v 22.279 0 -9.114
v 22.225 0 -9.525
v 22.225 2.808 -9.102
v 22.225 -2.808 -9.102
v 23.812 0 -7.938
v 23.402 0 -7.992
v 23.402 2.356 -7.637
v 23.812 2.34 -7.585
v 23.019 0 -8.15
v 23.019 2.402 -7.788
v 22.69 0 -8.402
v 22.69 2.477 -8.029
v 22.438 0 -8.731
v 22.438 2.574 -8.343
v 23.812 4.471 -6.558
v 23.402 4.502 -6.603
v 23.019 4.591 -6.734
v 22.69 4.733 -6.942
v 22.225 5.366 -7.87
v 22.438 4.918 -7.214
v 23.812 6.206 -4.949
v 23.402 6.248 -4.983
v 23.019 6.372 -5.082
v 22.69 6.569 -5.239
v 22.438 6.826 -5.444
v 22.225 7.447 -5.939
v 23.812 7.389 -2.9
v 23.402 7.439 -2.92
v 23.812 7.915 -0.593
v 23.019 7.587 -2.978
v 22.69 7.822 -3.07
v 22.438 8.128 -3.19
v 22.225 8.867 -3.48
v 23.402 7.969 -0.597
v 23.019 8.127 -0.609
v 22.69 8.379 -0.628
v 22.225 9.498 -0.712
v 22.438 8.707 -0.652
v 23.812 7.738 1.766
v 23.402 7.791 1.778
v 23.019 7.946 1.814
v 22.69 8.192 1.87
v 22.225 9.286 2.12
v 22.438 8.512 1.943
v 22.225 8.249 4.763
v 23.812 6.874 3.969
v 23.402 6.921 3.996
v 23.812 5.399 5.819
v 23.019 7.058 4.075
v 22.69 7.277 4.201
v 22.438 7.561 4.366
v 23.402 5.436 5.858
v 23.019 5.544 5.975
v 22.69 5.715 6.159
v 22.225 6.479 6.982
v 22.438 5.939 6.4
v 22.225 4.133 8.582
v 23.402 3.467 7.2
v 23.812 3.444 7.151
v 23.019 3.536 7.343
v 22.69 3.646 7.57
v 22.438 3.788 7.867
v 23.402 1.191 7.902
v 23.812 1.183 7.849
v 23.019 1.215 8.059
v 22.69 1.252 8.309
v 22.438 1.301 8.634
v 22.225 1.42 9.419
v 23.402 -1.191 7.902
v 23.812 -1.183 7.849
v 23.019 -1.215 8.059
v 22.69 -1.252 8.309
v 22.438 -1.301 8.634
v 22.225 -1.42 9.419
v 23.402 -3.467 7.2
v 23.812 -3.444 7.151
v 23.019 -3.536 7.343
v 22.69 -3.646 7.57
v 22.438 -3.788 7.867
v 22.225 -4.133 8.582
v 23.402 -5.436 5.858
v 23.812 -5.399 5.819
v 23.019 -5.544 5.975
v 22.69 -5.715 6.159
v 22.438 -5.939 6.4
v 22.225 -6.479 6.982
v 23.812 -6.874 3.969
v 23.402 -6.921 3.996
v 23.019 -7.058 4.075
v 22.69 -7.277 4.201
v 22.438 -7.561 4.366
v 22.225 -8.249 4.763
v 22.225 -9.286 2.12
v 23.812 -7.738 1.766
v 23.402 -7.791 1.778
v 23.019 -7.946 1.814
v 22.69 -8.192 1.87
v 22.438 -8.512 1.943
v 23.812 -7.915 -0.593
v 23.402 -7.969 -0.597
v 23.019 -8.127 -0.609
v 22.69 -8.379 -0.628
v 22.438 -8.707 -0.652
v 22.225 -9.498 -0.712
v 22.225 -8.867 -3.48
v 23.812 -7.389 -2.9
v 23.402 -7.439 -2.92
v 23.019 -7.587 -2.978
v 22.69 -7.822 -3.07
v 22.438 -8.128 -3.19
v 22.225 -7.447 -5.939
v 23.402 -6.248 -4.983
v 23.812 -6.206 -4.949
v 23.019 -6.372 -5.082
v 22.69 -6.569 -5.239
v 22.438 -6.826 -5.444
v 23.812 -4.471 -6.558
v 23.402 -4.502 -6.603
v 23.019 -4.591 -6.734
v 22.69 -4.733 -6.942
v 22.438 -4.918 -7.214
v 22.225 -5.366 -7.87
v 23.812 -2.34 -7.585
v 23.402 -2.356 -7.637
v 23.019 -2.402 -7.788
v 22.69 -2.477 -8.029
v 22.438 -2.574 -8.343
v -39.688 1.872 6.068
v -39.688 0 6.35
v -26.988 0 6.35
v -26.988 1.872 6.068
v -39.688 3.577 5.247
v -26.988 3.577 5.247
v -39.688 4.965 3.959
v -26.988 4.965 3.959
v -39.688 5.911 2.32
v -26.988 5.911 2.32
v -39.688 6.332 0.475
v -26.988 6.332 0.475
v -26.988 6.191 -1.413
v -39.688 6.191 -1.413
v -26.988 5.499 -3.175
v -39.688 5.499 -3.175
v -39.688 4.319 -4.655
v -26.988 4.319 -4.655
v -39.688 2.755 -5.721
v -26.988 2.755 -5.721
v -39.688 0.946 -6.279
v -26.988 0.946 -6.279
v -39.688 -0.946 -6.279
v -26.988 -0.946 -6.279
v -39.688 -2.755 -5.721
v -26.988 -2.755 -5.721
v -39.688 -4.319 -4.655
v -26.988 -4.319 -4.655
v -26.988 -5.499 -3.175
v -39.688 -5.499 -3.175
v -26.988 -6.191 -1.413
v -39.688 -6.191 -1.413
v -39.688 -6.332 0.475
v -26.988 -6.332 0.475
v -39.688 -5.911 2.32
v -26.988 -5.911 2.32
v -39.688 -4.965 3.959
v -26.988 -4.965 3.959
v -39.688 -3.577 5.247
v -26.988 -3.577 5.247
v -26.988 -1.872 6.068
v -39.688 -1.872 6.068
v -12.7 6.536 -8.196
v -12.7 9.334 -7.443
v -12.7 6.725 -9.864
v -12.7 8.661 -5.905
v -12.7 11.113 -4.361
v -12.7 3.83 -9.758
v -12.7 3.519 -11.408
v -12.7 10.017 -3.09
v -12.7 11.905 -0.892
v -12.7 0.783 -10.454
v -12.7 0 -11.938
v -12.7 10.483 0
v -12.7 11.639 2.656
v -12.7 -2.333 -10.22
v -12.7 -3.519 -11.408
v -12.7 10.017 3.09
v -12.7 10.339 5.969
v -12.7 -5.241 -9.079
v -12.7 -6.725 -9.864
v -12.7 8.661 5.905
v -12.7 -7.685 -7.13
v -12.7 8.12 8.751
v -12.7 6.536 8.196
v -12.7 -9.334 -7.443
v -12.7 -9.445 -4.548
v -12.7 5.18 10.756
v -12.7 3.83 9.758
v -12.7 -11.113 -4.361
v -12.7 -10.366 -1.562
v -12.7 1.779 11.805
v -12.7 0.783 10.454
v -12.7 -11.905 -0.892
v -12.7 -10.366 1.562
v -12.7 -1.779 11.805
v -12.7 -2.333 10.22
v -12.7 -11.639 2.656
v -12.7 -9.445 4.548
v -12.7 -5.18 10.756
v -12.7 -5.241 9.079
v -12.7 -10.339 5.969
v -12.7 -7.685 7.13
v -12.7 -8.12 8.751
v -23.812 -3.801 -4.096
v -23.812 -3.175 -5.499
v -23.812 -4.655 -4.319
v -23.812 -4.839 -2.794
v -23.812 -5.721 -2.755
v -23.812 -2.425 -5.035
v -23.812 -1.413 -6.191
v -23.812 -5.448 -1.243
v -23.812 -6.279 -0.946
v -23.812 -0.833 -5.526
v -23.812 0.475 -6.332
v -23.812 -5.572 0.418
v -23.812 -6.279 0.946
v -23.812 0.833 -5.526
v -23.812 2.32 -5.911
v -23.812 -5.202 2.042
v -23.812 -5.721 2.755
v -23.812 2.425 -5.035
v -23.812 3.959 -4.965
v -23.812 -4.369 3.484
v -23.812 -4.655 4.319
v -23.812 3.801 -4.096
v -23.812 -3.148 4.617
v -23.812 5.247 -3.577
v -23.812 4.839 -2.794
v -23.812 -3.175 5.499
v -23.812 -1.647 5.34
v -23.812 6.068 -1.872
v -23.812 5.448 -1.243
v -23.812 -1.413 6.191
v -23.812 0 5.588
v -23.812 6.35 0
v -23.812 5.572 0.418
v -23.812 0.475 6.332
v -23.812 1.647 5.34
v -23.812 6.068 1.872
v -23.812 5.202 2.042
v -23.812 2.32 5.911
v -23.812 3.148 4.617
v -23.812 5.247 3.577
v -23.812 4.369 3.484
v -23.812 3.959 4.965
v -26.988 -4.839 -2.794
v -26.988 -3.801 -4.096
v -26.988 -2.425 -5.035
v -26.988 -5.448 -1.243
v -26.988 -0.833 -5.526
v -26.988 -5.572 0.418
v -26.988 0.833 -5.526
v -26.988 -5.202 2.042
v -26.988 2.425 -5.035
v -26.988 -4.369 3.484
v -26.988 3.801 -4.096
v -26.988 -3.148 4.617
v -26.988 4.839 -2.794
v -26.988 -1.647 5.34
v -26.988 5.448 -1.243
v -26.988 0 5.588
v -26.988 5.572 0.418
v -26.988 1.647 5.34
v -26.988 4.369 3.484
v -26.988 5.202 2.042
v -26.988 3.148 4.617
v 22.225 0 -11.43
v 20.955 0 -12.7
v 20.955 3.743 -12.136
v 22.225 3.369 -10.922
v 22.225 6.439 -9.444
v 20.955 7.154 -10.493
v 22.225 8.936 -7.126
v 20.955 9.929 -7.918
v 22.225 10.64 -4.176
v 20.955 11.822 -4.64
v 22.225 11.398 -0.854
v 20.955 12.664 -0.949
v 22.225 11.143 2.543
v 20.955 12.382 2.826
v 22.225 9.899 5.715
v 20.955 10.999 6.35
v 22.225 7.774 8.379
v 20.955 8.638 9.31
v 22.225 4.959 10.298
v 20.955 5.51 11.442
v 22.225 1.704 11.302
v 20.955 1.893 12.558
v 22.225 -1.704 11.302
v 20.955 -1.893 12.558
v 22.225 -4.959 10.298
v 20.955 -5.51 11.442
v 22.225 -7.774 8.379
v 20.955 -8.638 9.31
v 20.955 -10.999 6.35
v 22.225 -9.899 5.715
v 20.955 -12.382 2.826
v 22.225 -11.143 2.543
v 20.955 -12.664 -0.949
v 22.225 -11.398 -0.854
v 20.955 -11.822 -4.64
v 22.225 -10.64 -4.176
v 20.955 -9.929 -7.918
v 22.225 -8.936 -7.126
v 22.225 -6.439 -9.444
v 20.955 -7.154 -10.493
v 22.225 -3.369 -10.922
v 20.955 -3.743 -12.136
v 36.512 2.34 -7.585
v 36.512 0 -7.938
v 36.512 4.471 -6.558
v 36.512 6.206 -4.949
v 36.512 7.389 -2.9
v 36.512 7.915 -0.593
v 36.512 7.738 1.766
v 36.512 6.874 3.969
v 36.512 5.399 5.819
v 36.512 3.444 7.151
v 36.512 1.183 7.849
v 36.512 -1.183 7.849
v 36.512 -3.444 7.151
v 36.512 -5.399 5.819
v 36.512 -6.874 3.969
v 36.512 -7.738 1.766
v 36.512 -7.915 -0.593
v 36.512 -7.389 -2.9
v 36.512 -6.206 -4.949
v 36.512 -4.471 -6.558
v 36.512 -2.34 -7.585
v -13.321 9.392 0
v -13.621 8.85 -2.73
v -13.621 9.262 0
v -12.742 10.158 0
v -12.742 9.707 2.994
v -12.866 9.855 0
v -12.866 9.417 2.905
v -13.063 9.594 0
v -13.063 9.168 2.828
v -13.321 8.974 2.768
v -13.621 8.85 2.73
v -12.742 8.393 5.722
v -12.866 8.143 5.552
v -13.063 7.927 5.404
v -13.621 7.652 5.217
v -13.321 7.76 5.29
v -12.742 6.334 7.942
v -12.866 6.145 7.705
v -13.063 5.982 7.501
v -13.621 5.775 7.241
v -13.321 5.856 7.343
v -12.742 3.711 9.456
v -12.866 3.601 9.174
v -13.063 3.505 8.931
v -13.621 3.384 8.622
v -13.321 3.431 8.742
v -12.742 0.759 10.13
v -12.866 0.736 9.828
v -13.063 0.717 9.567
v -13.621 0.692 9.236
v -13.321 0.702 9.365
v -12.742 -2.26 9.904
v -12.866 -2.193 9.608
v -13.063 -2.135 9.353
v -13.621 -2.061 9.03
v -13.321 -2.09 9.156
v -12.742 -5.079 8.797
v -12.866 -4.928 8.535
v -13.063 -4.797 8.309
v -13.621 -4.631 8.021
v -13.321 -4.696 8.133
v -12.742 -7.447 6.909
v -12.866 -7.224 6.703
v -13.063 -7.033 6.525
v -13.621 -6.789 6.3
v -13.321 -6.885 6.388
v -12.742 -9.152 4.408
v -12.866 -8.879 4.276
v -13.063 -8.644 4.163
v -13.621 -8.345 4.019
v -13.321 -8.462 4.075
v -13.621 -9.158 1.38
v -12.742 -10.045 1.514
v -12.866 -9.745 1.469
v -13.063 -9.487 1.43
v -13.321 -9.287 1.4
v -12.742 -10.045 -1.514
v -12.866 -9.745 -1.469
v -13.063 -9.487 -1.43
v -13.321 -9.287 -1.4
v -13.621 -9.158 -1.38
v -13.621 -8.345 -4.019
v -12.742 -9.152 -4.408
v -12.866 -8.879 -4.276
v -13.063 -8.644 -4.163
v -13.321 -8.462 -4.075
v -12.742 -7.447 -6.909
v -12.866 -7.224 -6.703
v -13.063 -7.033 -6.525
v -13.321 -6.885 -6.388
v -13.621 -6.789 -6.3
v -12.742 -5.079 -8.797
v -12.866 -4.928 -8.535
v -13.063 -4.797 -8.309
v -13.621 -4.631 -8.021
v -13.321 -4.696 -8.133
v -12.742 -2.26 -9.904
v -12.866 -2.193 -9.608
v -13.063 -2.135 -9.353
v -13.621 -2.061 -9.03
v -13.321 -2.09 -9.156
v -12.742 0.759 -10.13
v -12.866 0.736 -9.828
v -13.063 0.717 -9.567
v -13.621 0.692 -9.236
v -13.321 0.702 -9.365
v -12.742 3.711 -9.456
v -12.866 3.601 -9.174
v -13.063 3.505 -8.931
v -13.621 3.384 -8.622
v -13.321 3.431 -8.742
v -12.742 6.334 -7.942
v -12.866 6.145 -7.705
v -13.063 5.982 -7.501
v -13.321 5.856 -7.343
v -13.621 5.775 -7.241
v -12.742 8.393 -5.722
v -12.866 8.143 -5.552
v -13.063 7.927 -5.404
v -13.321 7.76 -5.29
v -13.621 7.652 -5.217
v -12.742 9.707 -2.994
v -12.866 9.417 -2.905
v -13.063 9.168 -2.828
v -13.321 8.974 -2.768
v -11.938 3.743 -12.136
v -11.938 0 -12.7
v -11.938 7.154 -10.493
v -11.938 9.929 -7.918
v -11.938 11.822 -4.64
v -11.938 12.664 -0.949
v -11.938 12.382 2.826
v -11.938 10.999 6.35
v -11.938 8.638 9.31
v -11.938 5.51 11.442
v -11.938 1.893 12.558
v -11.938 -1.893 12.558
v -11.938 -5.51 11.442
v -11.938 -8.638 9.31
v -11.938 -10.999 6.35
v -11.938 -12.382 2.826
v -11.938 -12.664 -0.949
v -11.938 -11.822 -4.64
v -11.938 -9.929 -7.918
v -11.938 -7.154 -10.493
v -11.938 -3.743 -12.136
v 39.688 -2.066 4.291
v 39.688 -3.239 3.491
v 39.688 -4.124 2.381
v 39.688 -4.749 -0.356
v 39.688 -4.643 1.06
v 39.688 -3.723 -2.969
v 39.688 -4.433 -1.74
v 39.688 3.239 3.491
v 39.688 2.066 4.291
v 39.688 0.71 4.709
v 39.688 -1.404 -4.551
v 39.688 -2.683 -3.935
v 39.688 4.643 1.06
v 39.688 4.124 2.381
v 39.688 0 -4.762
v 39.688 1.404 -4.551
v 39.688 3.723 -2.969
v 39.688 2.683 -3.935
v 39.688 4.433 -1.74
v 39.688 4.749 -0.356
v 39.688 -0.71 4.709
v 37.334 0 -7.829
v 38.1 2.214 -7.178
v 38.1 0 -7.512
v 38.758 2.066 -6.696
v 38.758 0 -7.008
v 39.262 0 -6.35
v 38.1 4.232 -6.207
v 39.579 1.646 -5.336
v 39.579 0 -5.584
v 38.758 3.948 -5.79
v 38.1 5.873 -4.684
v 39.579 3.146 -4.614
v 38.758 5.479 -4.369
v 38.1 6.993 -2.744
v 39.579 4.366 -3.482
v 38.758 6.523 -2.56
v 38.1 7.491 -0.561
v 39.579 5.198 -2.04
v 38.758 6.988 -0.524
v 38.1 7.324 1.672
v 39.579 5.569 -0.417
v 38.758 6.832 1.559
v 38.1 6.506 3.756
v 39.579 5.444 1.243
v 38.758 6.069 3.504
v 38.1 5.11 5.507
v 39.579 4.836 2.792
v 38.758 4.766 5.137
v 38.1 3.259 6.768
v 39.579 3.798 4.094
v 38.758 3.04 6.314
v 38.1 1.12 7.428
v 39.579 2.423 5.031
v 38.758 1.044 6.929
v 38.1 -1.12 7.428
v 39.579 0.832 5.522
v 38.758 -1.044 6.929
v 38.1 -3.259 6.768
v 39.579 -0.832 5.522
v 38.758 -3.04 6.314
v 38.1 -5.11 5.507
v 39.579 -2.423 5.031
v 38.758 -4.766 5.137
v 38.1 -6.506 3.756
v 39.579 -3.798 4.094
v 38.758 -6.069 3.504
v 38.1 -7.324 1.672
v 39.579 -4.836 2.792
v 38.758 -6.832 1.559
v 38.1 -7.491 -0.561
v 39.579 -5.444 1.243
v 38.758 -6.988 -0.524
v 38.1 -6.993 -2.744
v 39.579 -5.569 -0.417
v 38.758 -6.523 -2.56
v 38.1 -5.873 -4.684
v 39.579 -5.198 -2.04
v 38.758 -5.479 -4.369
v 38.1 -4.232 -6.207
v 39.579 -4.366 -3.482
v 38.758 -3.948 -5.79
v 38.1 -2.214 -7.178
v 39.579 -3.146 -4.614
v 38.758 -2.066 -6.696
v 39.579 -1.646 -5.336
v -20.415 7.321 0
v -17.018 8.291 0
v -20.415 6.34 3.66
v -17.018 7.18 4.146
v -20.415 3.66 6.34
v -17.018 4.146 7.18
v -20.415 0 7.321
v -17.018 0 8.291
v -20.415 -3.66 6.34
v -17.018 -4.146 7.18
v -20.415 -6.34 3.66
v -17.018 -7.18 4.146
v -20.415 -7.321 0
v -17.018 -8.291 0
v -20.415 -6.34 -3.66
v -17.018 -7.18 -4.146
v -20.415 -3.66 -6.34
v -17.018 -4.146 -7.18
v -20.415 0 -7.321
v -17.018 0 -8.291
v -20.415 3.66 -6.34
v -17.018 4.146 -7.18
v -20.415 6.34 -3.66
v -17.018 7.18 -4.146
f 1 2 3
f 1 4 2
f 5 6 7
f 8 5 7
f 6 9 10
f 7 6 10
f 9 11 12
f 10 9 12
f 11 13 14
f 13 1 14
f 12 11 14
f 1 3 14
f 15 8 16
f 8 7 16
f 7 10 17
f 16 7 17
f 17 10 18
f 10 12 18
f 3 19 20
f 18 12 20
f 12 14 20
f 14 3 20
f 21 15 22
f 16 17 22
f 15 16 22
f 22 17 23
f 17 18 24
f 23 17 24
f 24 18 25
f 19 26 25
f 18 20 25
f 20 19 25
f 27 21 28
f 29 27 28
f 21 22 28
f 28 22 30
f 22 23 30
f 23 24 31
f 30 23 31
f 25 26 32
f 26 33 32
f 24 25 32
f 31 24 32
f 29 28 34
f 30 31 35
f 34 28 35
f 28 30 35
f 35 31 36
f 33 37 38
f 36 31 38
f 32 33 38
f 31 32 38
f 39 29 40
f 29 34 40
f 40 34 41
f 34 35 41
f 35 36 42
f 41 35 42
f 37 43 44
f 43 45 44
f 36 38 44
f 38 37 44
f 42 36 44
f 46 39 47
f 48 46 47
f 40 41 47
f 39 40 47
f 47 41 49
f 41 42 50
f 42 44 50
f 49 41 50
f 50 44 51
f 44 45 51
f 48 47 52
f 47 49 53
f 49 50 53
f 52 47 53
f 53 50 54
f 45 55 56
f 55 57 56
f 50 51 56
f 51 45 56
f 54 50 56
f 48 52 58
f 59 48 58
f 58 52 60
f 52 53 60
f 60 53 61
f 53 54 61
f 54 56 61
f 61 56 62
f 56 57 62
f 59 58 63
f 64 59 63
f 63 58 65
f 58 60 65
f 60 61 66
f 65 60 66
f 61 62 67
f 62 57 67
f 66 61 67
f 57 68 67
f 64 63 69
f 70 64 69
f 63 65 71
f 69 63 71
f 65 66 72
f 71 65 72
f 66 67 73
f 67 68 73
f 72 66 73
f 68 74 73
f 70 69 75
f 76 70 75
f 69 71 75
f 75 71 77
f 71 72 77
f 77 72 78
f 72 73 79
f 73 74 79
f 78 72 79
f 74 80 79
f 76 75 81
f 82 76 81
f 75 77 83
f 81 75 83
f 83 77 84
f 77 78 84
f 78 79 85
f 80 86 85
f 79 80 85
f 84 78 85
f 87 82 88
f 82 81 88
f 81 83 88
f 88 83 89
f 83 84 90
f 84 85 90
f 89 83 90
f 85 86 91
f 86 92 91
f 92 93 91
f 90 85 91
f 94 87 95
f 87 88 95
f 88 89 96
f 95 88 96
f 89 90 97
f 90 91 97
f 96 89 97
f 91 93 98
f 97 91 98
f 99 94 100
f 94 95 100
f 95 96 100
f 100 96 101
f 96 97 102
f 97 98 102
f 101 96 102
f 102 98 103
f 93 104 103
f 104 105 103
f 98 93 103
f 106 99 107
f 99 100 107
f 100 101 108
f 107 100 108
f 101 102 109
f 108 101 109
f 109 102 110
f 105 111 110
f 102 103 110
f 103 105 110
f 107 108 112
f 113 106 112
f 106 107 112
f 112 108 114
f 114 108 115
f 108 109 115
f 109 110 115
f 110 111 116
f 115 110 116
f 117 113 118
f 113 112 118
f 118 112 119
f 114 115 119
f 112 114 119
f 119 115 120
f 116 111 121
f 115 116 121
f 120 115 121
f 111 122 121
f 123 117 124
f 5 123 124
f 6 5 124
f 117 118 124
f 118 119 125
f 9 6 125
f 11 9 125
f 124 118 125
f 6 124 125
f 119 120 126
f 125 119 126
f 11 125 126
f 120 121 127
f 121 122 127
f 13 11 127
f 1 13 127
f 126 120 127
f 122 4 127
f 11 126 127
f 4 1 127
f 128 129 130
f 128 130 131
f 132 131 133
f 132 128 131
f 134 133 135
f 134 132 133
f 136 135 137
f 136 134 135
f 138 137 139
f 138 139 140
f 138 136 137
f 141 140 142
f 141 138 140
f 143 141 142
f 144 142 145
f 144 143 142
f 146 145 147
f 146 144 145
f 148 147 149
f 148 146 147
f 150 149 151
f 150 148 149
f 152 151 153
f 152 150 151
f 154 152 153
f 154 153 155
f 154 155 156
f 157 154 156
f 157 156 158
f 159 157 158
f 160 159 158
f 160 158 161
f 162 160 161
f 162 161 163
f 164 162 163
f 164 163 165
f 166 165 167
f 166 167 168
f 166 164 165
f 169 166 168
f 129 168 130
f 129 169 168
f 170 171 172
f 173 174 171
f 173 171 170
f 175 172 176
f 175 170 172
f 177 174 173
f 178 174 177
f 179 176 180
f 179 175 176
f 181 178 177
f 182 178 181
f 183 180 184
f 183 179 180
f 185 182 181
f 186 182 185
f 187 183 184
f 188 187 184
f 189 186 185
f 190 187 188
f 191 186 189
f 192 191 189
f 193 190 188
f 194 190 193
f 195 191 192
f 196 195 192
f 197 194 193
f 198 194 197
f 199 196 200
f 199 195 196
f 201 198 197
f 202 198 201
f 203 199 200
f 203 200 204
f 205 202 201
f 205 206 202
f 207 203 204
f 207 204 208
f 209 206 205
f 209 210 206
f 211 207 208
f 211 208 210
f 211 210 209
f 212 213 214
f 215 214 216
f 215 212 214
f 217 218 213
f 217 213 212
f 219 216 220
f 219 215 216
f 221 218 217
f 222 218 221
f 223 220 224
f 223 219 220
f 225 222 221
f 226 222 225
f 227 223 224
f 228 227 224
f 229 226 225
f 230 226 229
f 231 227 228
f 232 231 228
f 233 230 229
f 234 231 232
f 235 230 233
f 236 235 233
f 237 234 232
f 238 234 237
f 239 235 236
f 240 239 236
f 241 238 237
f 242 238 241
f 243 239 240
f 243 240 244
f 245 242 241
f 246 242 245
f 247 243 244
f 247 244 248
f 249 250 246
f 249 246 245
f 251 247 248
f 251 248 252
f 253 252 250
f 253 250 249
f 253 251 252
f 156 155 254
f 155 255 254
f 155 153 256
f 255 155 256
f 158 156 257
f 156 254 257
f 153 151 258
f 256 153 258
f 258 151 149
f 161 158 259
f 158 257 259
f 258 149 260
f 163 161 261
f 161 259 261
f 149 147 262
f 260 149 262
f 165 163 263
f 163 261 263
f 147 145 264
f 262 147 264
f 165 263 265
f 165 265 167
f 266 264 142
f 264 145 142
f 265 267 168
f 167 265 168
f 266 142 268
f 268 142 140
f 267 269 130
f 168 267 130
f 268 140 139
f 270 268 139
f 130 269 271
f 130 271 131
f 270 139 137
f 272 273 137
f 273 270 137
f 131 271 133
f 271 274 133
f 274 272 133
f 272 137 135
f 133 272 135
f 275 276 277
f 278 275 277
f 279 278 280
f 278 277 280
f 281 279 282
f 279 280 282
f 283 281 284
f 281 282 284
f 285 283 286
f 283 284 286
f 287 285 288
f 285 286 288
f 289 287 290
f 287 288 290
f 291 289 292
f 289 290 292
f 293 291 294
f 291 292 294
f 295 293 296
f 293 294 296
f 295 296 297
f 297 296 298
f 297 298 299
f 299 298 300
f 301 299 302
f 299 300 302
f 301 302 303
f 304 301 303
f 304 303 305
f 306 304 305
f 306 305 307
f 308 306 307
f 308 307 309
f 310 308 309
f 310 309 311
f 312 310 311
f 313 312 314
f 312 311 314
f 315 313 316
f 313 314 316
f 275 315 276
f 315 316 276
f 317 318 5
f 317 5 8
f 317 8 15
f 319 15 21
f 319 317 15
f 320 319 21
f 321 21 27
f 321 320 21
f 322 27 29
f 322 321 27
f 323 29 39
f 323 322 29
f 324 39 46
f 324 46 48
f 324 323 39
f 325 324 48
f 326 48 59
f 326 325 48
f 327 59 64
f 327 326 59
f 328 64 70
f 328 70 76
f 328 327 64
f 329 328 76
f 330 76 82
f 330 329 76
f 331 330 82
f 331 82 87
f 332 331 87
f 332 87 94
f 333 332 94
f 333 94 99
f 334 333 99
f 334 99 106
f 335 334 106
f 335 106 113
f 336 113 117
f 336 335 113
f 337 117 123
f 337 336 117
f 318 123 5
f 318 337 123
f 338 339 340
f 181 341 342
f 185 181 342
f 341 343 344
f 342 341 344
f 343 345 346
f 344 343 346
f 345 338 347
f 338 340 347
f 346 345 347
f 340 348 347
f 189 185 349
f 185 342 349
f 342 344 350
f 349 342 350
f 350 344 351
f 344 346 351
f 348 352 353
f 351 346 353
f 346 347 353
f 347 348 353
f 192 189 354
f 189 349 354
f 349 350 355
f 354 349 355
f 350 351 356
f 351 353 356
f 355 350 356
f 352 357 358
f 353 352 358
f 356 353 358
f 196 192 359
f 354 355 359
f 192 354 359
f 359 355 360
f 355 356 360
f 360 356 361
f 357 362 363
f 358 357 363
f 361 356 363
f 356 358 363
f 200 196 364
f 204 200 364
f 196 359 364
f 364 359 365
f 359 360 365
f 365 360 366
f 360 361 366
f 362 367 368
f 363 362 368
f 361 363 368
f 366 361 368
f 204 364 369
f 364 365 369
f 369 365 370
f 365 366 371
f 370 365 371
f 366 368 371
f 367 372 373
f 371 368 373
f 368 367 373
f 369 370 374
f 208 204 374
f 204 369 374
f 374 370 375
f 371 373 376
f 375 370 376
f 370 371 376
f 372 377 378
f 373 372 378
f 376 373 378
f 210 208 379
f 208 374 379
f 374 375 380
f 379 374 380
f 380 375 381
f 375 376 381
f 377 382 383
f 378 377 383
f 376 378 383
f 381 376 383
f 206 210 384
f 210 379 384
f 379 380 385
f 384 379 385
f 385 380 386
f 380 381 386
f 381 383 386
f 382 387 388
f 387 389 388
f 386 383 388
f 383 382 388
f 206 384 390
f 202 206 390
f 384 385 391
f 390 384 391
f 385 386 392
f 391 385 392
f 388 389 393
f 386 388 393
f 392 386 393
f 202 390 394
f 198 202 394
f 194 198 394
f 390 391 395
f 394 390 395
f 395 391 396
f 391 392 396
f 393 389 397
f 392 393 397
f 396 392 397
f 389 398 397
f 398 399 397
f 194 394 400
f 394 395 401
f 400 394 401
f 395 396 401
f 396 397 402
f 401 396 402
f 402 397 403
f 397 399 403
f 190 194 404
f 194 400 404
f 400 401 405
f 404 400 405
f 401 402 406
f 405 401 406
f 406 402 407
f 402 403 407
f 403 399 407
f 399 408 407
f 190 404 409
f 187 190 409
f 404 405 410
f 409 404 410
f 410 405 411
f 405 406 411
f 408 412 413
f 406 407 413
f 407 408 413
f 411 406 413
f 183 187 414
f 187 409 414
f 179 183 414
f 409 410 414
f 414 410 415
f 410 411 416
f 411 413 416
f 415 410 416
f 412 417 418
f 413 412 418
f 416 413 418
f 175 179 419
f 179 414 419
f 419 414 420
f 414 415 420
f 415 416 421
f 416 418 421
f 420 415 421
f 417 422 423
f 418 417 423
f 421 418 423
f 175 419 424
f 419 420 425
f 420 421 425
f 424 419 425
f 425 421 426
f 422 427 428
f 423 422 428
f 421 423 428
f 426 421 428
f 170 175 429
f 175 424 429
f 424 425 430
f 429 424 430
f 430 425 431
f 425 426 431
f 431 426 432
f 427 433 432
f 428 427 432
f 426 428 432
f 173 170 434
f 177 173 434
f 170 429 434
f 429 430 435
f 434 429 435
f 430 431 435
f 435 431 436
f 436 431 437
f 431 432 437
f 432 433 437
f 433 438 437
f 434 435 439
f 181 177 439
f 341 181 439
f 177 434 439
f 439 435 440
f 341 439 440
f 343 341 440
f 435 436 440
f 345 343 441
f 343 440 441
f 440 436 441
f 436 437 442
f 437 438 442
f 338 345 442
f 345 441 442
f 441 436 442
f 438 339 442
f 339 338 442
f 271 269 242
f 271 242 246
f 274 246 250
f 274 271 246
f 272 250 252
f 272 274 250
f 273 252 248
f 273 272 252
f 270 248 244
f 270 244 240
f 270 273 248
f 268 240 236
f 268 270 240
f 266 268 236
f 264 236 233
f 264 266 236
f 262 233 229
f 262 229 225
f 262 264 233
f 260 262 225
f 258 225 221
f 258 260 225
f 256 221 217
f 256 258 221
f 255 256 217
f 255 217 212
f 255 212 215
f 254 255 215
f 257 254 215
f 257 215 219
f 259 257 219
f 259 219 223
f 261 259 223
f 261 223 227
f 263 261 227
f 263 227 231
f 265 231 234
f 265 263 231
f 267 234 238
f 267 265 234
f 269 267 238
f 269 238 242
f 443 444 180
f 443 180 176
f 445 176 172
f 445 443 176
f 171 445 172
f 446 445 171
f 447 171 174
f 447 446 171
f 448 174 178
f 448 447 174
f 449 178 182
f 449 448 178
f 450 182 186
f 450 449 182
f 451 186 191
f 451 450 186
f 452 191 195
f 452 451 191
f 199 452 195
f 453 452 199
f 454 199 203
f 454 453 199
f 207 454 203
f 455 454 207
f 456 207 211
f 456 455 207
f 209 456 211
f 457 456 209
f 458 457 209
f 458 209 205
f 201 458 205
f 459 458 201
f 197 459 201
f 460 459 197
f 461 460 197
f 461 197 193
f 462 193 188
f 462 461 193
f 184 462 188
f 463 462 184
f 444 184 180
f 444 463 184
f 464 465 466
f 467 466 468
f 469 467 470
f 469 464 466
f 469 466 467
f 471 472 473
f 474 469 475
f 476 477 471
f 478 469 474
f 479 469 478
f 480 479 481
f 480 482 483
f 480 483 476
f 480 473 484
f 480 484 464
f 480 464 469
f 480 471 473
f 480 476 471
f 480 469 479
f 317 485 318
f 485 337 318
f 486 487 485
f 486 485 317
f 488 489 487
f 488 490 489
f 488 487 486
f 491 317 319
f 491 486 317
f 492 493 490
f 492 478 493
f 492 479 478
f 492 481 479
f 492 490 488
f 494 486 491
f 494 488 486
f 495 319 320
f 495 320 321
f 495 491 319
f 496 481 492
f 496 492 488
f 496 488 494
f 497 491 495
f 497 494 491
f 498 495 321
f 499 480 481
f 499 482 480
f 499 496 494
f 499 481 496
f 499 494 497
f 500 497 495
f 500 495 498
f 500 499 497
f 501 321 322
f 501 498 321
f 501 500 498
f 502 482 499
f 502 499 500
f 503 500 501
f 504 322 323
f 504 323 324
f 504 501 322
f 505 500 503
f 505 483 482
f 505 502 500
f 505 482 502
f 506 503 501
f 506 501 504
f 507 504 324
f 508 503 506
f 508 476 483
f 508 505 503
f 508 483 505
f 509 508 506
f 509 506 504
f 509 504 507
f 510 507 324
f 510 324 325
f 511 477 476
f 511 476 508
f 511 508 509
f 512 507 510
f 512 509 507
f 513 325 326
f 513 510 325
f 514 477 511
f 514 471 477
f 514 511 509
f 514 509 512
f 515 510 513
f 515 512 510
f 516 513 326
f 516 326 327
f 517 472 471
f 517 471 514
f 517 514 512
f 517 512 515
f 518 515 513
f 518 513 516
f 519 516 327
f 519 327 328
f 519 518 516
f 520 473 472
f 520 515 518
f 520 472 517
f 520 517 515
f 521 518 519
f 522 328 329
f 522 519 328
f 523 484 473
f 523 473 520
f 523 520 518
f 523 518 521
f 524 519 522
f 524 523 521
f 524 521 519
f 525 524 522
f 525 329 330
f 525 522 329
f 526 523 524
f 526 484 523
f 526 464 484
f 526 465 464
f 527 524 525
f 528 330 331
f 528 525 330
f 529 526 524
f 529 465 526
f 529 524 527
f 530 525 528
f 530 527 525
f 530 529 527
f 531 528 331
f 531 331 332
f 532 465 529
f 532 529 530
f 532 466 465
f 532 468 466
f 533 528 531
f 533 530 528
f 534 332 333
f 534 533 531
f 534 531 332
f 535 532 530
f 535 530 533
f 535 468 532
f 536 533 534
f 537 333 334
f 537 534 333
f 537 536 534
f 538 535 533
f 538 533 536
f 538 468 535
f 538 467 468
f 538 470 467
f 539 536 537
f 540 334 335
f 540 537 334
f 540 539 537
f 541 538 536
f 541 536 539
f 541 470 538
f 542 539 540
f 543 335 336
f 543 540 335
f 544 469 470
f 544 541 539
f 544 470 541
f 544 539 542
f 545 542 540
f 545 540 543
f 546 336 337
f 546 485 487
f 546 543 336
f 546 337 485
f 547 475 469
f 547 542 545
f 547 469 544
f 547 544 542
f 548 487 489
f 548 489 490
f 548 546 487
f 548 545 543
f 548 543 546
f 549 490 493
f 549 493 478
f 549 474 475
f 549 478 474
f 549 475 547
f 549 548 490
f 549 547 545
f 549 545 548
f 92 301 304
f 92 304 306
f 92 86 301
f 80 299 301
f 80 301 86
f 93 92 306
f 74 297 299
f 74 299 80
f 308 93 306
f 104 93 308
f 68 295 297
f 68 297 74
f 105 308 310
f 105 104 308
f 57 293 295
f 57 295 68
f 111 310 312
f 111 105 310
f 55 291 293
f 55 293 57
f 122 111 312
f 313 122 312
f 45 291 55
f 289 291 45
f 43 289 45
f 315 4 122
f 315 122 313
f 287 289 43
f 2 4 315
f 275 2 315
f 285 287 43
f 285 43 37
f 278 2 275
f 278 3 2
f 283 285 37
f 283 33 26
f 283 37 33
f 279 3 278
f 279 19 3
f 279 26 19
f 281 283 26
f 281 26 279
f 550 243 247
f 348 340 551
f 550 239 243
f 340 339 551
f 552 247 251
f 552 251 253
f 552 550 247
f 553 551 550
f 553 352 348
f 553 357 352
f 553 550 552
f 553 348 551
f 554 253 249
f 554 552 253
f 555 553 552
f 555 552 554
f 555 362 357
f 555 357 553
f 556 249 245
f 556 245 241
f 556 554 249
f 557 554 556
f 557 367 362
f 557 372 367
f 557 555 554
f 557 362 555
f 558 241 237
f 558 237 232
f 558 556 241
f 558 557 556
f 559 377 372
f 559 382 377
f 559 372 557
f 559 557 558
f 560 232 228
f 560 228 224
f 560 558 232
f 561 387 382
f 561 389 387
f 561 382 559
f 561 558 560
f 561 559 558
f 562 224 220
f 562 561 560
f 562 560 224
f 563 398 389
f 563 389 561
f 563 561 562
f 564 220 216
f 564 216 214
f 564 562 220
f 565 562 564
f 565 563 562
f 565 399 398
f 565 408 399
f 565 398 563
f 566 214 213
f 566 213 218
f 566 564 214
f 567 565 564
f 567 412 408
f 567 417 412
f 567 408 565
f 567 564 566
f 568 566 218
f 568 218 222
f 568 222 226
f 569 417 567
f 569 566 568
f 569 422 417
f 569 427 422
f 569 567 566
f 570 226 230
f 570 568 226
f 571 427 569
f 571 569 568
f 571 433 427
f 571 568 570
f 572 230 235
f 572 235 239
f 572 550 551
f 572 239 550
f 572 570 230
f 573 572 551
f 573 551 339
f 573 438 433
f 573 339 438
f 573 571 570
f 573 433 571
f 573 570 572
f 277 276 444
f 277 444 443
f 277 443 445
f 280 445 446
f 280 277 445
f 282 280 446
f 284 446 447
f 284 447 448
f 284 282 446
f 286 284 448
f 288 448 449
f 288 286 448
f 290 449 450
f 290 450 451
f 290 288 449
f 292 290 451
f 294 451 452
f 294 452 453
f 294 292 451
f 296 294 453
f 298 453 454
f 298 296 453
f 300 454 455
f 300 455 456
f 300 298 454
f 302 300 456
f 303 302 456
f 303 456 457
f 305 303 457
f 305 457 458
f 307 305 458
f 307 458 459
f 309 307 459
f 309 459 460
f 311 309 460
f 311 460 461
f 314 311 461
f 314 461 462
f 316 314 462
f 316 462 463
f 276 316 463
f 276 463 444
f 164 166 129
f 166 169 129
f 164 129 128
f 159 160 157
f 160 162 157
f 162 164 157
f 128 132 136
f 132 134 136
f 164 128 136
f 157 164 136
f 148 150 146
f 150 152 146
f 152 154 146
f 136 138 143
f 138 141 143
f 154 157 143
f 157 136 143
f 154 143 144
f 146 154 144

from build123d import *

# Parameters (mm, degrees)
BOSS_EXTRUDE1_DEPTH      = 39.6875
BOSS_EXTRUDE1_DEPTH_BACK = 39.6875
SKETCH2_R                = 12.7
SKETCH3_OUTSIDE_W        = 44.824
SKETCH3_OUTSIDE_H        = 44.824
SKETCH3_OUTSIDE_R        = 7.9375
CUT_EXTRUDE1_DEPTH       = 17.4625
FILLET1_R                = 3.175
FILLET2_R                = 1.5875
CHAMFER1_SIZE            = 1.27
SKETCH4_OUTSIDE_W        = 44.824
SKETCH4_OUTSIDE_H        = 44.824
SKETCH4_OUTSIDE_R        = 6.35
CUT_EXTRUDE2_DEPTH       = 12.7
SKETCH6_OUTSIDE_W        = 44.824
SKETCH6_OUTSIDE_H        = 44.824
SKETCH6_OUTSIDE_R        = 5.588
CUT_EXTRUDE3_DEPTH       = 3.175
FILLET3_R                = 1.27
CHAMFER2_SIZE            = 0.762


with BuildPart() as part:
    # Sketch2 → Boss-Extrude1 (new, two sides: drawn at the far end of the back side and taken through both)
    with BuildSketch(Plane(origin=(0, 0, 0), x_dir=(0, 0, -1), z_dir=(1, 0, 0)).offset(-BOSS_EXTRUDE1_DEPTH_BACK)):
        Circle(SKETCH2_R)
    extrude(amount=BOSS_EXTRUDE1_DEPTH + BOSS_EXTRUDE1_DEPTH_BACK)

    # Sketch3 outside → Cut-Extrude1 (cut)
    with BuildSketch(Plane(origin=(39.6875, 0, 0), x_dir=(0, 0, -1), z_dir=(1, 0, 0))):
        Rectangle(SKETCH3_OUTSIDE_W, SKETCH3_OUTSIDE_H)
        Circle(SKETCH3_OUTSIDE_R, mode=Mode.SUBTRACT)
    extrude(amount=-CUT_EXTRUDE1_DEPTH, mode=Mode.SUBTRACT)

    # Fillet1
    fillet1_edges = [part.edges().sort_by_distance(p)[0] for p in [
        (39.6875, 0, 7.9375),
    ]]
    fillet(fillet1_edges, radius=FILLET1_R)

    # Fillet2
    fillet2_edges = [part.edges().sort_by_distance(p)[0] for p in [
        (22.225, 0, 7.9375),
    ]]
    fillet(fillet2_edges, radius=FILLET2_R)

    # Chamfer1
    chamfer1_edges = [part.edges().sort_by_distance(p)[0] for p in [
        (22.225, 0, 12.7),
    ]]
    chamfer(chamfer1_edges, length=CHAMFER1_SIZE)

    # Sketch4 outside → Cut-Extrude2 (cut)
    with BuildSketch(Plane.ZY.offset(39.6875)):
        Rectangle(SKETCH4_OUTSIDE_W, SKETCH4_OUTSIDE_H)
        Circle(SKETCH4_OUTSIDE_R, mode=Mode.SUBTRACT)
    extrude(amount=-CUT_EXTRUDE2_DEPTH, mode=Mode.SUBTRACT)

    # Sketch6 outside → Cut-Extrude3 (cut)
    with BuildSketch(Plane.ZY.offset(26.9875)):
        Rectangle(SKETCH6_OUTSIDE_W, SKETCH6_OUTSIDE_H)
        Circle(SKETCH6_OUTSIDE_R, mode=Mode.SUBTRACT)
    extrude(amount=-CUT_EXTRUDE3_DEPTH, mode=Mode.SUBTRACT)

    # Sketch13 → Cut-Revolve1 (revolve, cut)
    with BuildSketch(Plane.XY):
        Polygon((-23.8125, 6.35), (-12.7, 9.525), (-12.7, 12.7), (-23.8125, 12.7), align=None)
    revolve(axis=Axis((-43.65625, 0, 0), (1, 0, 0)), mode=Mode.SUBTRACT)

    # Fillet3
    fillet3_edges = [part.edges().sort_by_distance(p)[0] for p in [
        (-12.7, -9.525, 0),
    ]]
    fillet(fillet3_edges, radius=FILLET3_R)

    # Chamfer2
    chamfer2_edges = [part.edges().sort_by_distance(p)[0] for p in [
        (-12.7, 0, 12.7),
    ]]
    chamfer(chamfer2_edges, length=CHAMFER2_SIZE)


solid = part.part
